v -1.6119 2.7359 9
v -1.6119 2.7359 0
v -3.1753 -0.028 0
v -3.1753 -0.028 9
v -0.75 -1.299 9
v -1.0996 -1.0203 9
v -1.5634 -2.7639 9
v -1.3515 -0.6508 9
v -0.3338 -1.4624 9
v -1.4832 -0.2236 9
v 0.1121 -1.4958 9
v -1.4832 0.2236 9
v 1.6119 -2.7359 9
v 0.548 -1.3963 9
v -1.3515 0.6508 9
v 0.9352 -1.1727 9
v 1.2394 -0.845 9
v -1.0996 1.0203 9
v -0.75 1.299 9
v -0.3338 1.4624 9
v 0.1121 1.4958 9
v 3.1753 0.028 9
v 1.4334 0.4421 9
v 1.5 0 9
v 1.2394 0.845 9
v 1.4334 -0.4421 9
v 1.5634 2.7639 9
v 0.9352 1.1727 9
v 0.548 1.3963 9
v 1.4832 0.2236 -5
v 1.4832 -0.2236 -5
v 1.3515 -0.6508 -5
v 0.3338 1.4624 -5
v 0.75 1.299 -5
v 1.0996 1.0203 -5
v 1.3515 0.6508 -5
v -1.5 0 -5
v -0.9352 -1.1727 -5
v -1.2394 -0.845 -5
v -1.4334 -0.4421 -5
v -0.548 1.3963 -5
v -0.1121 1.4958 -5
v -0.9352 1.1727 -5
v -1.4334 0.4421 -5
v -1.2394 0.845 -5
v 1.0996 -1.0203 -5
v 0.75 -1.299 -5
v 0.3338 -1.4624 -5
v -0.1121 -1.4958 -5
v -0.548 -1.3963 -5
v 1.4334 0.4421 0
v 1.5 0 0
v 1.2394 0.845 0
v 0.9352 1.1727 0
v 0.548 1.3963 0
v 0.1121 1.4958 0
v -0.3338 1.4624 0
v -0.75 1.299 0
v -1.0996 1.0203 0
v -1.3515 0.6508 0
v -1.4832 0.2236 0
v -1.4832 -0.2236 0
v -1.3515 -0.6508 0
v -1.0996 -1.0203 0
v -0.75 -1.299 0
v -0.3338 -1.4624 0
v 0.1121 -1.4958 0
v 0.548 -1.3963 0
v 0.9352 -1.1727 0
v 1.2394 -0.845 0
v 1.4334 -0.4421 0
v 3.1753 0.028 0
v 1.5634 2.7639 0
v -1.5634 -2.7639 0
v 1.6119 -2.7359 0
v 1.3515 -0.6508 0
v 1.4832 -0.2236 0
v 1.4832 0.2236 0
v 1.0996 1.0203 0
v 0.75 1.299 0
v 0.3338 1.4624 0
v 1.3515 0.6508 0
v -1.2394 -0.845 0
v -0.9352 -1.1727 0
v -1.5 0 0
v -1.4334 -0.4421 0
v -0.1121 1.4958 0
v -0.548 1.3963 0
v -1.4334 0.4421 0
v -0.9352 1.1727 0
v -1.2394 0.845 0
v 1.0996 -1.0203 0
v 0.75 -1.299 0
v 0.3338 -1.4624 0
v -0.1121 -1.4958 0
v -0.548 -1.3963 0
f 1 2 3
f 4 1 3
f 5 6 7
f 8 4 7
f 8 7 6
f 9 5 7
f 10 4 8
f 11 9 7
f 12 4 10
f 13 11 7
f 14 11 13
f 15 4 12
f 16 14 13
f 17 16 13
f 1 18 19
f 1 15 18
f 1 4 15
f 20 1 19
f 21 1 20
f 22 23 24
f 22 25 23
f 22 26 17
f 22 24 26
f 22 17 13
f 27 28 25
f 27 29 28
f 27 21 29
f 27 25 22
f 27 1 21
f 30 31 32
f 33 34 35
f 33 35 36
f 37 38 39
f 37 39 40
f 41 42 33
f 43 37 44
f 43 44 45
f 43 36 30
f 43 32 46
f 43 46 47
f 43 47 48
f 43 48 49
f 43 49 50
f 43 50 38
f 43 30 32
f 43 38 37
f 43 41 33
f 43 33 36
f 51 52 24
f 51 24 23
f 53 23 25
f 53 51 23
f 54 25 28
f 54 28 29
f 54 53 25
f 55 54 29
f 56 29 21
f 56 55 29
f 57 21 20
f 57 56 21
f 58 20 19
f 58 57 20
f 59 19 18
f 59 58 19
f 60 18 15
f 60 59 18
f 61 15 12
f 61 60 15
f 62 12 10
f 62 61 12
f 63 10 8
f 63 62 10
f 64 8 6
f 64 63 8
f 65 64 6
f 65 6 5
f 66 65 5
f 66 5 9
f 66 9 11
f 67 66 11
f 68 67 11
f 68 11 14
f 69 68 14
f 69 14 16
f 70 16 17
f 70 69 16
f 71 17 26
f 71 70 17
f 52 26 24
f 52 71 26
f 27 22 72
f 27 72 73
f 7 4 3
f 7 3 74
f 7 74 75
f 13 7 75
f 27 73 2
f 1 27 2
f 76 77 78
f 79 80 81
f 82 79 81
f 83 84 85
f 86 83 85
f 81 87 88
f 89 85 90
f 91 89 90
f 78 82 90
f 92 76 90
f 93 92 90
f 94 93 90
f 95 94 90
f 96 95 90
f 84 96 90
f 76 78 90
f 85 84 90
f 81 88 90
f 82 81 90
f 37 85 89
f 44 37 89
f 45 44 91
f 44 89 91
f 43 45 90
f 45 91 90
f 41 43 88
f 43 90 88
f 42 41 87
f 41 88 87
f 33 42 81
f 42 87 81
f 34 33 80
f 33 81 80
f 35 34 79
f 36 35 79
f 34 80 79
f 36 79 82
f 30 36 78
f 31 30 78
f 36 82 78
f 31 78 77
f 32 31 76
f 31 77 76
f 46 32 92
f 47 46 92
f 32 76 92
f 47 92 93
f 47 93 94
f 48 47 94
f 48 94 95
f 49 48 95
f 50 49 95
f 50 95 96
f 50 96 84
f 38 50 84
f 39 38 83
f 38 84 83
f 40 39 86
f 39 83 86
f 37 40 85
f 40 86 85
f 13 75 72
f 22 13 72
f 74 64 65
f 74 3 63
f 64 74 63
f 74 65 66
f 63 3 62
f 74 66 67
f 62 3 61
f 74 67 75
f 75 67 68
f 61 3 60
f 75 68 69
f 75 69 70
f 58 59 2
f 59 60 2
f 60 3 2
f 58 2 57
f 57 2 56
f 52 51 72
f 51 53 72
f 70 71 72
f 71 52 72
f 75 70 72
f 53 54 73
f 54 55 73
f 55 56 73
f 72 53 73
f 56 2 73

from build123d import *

# Parameters (mm, degrees)
SKETCH_1_R      = 1.5
EXTRUDE_1_DEPTH = 9
SKETCH_2_R      = 1.5
EXTRUDE_2_DEPTH = 5


with BuildPart() as part:
    # 草图1 → 凸台-拉伸1 (new body)
    with BuildSketch(Plane.XY):
        Polygon((1.61185848, -2.735917684), (3.175303457, 0.027951549), (1.563444977, 2.763869233), (-1.61185848, 2.735917684), (-3.175303457, -0.027951549), (-1.563444977, -2.763869233), align=None)
        Circle(SKETCH_1_R, mode=Mode.SUBTRACT)
    extrude(amount=EXTRUDE_1_DEPTH)


with BuildPart() as body_2:
    # 草图2 → 凸台-拉伸2 (new body)
    with BuildSketch(Plane(origin=(0, 0, 0), x_dir=(-1, 0, 0), z_dir=(0, 0, -1))):
        Circle(SKETCH_2_R)
    extrude(amount=EXTRUDE_2_DEPTH)


solid = Compound([part.part, body_2.part])
